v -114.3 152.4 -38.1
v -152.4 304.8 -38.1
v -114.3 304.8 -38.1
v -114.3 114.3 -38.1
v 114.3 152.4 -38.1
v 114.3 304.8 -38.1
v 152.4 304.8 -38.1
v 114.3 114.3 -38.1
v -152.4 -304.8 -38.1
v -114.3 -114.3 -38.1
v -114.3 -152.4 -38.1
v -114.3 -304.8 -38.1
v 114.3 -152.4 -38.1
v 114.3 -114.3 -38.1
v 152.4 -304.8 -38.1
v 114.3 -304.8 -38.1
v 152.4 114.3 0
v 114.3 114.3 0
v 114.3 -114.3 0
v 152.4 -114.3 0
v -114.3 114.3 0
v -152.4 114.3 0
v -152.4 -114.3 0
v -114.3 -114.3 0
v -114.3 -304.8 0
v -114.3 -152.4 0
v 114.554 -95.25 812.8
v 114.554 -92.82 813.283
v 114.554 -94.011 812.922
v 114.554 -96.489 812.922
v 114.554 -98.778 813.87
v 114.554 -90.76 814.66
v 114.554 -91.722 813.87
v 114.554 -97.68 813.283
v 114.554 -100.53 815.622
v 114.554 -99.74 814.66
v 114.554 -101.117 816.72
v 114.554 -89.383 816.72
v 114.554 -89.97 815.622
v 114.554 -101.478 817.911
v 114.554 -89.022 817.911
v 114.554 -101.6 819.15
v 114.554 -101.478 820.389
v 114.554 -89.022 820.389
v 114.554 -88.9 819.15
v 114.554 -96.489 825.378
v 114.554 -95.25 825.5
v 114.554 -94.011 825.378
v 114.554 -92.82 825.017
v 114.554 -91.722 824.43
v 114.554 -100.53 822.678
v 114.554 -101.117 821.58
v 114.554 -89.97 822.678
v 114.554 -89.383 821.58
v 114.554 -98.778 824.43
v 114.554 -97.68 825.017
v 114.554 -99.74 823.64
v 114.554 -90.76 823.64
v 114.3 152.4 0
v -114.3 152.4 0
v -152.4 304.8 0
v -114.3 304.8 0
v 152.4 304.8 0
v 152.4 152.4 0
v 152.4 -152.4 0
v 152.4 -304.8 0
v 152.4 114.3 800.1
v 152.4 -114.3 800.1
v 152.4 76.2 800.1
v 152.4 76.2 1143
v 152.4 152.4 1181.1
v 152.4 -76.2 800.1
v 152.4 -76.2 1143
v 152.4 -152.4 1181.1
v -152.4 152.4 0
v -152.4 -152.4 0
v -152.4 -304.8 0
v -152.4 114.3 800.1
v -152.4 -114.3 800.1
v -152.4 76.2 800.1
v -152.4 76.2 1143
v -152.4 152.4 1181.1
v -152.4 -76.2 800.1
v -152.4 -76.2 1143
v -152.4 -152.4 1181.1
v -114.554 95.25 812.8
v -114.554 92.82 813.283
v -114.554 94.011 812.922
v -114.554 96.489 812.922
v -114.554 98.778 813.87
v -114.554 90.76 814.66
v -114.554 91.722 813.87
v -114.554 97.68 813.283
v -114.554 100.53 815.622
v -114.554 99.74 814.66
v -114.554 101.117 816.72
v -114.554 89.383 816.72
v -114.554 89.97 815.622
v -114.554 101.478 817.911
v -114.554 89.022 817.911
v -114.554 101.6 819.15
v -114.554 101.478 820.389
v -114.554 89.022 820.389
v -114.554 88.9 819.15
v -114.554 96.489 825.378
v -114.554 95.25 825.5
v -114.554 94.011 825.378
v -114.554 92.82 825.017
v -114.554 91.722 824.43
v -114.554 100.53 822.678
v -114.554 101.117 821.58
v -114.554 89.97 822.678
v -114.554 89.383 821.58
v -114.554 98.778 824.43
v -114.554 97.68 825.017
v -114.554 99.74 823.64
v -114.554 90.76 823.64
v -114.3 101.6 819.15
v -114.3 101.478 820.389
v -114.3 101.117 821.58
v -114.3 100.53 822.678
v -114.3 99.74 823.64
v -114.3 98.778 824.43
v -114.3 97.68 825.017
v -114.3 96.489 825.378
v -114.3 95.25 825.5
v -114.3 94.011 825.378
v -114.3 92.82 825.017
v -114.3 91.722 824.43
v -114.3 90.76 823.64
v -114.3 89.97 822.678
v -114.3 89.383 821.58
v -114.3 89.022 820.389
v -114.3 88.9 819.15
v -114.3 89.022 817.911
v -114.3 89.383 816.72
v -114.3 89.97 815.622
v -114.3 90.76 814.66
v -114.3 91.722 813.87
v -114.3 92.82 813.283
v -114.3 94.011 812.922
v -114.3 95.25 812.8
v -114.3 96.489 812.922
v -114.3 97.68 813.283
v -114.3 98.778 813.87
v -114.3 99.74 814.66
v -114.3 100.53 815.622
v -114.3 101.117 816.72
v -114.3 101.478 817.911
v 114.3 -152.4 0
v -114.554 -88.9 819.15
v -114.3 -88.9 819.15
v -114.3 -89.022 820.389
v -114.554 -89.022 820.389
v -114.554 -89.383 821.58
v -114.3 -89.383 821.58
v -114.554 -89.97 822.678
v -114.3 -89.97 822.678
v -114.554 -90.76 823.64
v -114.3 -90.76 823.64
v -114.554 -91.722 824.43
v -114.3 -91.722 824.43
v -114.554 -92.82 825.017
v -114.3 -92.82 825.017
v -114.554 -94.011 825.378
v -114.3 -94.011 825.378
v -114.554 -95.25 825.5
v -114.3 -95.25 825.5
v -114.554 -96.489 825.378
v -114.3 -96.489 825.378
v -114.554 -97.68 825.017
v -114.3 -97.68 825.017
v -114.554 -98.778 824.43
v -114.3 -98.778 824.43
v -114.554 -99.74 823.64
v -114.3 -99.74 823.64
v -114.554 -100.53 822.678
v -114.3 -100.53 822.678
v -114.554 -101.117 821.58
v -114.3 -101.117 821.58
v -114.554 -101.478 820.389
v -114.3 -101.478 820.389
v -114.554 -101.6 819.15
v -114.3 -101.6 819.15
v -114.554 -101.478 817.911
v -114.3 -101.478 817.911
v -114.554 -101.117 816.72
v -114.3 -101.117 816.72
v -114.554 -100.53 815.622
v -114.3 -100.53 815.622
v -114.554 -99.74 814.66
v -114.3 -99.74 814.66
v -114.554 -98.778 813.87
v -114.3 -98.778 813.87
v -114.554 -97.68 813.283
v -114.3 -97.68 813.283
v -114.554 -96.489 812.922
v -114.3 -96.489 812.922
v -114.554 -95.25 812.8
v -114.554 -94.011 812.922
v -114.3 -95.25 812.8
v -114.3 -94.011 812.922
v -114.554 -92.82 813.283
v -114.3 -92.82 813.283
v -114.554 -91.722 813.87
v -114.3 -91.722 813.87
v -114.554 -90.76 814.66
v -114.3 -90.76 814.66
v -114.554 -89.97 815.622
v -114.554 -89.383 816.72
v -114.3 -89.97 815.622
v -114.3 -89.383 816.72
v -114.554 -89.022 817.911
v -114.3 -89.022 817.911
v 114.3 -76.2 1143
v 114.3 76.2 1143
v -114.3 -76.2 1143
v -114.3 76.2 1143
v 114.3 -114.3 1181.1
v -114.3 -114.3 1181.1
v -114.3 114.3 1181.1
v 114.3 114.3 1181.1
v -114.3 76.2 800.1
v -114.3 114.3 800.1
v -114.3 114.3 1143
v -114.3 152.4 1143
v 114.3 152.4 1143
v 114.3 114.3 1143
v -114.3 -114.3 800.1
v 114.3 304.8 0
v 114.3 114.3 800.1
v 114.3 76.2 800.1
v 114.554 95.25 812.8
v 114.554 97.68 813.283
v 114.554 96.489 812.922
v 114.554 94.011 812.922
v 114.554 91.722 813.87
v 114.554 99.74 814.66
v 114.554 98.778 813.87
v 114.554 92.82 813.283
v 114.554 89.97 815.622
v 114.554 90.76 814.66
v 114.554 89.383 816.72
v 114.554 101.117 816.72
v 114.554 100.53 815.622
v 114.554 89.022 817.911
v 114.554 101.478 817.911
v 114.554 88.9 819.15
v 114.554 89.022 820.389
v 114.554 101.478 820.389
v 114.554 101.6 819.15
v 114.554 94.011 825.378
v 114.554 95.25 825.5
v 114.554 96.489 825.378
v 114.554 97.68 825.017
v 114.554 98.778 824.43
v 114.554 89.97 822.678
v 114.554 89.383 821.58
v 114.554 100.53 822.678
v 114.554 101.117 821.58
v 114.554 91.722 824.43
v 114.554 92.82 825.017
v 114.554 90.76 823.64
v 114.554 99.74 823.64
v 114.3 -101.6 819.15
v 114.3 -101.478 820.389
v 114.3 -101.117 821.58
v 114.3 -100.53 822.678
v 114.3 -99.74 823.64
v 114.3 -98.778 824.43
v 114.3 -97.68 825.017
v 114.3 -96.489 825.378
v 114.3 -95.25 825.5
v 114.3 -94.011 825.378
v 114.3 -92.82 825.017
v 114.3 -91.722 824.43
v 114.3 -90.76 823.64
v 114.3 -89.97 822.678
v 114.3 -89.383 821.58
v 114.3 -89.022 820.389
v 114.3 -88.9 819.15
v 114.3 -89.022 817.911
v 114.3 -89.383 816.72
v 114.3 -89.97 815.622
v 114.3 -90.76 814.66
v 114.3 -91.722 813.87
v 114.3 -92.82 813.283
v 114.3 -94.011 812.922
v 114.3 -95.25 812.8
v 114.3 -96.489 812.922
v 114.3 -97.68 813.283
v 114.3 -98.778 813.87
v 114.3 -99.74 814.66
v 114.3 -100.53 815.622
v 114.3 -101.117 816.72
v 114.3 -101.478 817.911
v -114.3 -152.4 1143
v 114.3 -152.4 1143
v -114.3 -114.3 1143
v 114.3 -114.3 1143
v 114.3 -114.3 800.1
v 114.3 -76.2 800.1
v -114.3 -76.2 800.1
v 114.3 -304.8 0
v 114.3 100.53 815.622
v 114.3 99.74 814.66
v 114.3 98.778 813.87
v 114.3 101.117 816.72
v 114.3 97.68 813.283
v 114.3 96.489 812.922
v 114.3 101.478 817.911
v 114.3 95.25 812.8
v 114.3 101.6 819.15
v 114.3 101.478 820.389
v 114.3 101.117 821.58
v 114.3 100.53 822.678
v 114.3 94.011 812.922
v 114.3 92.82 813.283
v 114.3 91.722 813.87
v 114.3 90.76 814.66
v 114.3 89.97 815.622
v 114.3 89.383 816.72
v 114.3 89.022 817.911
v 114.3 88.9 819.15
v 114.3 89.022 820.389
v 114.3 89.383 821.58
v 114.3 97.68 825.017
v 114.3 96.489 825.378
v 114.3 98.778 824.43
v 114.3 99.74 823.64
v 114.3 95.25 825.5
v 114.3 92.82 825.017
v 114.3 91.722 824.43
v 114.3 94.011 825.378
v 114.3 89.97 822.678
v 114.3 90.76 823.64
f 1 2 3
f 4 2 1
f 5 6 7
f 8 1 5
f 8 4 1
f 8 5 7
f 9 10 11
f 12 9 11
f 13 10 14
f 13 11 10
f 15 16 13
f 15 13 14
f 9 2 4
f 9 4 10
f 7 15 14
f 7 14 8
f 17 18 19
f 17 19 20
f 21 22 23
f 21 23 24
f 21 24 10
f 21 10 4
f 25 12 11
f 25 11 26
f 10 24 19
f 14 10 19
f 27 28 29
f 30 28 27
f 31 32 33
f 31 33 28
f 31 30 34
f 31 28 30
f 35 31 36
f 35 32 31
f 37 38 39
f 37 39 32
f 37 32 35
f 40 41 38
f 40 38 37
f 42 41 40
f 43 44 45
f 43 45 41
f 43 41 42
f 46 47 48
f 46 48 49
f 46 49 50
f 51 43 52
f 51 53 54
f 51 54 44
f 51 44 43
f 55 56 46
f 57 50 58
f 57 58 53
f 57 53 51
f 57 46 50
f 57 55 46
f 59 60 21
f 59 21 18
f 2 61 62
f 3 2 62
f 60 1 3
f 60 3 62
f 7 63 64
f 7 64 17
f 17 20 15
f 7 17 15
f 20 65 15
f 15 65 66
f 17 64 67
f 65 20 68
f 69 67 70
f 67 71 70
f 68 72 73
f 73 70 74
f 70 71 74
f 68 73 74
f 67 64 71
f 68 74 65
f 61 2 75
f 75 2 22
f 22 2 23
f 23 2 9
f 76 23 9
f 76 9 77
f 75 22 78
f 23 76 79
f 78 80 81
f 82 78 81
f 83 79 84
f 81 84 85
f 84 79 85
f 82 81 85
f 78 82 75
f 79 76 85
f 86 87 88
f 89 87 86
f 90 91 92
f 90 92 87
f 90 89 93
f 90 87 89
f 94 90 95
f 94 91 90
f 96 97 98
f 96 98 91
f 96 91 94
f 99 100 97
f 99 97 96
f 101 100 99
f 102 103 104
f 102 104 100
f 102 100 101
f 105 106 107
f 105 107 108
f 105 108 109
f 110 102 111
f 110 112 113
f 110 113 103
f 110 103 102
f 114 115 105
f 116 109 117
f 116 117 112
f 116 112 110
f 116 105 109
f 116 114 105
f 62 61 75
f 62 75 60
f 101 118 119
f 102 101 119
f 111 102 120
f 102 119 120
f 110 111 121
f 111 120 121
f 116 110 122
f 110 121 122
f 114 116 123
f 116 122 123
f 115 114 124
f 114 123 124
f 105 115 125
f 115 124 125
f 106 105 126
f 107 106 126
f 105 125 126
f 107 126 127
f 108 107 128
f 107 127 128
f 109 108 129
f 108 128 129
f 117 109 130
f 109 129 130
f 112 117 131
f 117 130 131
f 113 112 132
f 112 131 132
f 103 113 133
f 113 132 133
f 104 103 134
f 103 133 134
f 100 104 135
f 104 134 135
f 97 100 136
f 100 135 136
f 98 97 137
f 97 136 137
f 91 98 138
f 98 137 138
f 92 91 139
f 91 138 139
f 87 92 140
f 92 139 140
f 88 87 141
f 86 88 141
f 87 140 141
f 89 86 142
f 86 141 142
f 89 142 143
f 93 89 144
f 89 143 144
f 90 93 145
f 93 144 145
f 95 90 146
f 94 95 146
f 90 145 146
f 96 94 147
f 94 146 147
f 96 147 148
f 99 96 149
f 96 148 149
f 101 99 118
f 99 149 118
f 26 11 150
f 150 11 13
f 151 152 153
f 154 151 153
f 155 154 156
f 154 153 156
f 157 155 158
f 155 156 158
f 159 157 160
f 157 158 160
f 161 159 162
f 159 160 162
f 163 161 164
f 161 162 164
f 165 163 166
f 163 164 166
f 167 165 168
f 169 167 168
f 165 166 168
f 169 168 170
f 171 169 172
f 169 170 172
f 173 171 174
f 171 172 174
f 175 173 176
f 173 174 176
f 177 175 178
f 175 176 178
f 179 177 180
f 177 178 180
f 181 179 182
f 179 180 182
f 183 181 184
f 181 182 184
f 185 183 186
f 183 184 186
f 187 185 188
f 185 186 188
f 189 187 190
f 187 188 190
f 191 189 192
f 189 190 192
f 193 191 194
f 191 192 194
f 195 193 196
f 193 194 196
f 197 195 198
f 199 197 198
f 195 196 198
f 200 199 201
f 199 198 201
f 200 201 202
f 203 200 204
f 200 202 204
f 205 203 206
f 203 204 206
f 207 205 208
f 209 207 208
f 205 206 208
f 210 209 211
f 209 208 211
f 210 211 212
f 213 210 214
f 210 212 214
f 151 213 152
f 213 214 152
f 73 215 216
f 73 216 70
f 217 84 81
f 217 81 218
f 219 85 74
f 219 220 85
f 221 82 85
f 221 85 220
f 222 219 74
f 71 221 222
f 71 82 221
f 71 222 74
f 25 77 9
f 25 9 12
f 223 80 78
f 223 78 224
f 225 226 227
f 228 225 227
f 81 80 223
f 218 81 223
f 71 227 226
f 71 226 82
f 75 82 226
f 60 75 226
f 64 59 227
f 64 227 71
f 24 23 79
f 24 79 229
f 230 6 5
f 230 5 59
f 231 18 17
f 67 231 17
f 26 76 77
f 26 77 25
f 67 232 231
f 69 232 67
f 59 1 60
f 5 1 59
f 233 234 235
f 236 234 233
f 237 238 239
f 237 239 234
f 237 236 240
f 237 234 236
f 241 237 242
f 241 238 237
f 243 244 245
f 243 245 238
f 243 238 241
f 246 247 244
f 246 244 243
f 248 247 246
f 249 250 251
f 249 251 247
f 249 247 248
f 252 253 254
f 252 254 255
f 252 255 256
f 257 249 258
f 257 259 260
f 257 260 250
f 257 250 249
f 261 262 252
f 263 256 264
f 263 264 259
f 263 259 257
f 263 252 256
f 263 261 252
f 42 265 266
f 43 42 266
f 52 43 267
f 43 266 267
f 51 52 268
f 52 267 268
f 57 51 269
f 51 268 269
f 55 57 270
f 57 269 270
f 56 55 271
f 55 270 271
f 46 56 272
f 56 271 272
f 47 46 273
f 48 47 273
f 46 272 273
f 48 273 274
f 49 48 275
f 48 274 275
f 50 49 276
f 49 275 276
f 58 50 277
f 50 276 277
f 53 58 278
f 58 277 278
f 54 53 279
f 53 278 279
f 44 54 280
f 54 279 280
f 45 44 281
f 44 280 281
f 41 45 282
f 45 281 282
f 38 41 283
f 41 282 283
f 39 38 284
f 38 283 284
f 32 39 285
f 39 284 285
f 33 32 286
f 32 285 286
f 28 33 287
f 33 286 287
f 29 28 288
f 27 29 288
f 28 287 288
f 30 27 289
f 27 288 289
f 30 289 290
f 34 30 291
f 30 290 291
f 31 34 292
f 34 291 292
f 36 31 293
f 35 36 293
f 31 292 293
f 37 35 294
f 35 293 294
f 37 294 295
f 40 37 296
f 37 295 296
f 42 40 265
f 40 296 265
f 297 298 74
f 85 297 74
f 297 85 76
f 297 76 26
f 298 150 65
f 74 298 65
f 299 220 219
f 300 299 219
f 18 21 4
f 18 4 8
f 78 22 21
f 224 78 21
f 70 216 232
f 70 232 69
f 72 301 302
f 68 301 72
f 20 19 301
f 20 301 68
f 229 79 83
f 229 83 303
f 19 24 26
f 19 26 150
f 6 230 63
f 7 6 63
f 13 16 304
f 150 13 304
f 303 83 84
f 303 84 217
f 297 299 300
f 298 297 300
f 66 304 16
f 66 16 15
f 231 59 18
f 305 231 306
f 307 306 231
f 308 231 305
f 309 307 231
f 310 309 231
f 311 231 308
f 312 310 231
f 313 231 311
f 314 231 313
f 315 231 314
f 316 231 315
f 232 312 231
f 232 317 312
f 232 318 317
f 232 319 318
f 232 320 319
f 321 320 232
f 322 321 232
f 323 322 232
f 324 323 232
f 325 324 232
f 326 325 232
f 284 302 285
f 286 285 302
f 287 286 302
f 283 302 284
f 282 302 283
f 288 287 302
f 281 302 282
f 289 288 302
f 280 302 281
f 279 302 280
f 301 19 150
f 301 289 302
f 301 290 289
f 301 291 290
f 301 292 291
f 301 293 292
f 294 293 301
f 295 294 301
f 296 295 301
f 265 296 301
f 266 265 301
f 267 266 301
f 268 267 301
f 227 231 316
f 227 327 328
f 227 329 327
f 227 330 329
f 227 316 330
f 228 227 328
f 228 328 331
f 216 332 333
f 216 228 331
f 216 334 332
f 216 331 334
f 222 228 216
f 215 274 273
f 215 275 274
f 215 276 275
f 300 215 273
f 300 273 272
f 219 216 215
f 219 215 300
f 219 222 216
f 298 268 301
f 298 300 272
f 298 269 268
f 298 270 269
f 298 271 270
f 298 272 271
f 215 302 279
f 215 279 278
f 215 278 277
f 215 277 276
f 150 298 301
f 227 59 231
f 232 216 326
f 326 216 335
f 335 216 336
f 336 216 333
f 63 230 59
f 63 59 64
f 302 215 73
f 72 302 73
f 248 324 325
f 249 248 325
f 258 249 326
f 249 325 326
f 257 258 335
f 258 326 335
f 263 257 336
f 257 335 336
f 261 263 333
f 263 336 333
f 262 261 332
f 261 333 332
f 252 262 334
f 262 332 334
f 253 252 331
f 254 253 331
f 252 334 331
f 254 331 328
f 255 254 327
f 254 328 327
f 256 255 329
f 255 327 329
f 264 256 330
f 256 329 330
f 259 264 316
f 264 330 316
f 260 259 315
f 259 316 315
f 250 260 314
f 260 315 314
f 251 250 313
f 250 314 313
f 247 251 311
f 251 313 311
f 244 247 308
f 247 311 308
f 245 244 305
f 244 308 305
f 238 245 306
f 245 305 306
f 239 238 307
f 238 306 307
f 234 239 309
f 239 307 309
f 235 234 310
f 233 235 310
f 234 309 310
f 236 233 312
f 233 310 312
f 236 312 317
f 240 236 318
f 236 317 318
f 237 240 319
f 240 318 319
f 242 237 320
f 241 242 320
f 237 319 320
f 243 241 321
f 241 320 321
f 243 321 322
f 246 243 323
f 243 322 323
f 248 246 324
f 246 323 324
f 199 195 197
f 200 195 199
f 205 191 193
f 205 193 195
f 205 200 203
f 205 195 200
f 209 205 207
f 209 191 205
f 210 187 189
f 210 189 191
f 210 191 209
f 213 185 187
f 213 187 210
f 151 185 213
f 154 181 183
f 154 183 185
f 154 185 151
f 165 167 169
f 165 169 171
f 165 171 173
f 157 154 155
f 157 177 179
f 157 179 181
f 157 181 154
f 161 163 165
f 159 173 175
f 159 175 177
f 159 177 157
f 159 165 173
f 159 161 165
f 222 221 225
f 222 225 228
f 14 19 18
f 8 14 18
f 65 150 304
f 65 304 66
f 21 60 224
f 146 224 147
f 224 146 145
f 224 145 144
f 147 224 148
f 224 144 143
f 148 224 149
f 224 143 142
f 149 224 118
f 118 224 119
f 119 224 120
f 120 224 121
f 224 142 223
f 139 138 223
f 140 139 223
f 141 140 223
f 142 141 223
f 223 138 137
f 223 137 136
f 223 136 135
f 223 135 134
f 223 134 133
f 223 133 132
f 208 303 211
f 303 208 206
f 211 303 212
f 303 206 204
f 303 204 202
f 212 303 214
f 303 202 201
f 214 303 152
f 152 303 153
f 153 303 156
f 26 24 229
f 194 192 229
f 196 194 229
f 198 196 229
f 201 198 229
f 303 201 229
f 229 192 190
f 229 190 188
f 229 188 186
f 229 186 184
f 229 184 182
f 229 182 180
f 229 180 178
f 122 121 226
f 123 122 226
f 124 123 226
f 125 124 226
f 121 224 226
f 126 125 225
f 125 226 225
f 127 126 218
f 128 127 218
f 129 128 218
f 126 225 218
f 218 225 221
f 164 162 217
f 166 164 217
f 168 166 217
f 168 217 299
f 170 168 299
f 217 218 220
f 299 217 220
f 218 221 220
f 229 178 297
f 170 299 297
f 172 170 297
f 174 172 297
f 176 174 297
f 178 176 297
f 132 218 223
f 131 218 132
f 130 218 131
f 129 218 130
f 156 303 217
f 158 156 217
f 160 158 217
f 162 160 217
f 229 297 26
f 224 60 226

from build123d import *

# Parameters (mm, degrees)
F0_W      = 304.8
F0_H      = 304.8
F1_DEPTH  = 38.1
F2_W      = 228.6
F2_H      = 228.6
F3_DEPTH  = 38.1
F4_W      = 38.1
F4_H      = 38.1
F5_DEPTH  = 1143
F6_W      = 304.8
F6_H      = 304.8
F7_DEPTH  = 38.1
F8_W      = 228.6
F8_H      = 228.6
F9_DEPTH  = 38.1
F10_W     = 38.1
F10_H     = 38.1
F11_DEPTH = 342.9
F12_W     = 38.1
F12_H     = 38.1
F13_DEPTH = 342.9
F14_R     = 6.35
F16_DEPTH = 0.254
F15_R     = 6.35
F17_DEPTH = 0.254
F18_W     = 38.1
F18_H     = 38.1
F19_DEPTH = 304.8


with BuildPart() as f1:
    # F0 (on Top) → F1 (new body)
    with BuildSketch(Plane.XY):
        Rectangle(F0_W, F0_H)
    extrude(amount=-F1_DEPTH)

    # F2 (on face) → F3 (cut)
    with BuildSketch(Plane.XY):
        Rectangle(F2_W, F2_H)
    extrude(amount=-F3_DEPTH, mode=Mode.SUBTRACT)

    # F4 (on face) → F5 (join)
    with BuildSketch(Plane.XY):
        with Locations((-133.35, 133.35)):
            Rectangle(F4_W, F4_H)
        with Locations((133.35, 133.35)):
            Rectangle(F4_W, F4_H)
        with Locations((133.35, -133.35)):
            Rectangle(F4_W, F4_H)
        with Locations((-133.35, -133.35)):
            Rectangle(F4_W, F4_H)
    extrude(amount=F5_DEPTH)

    # F6 (on face) → F7 (join)
    with BuildSketch(Plane.XY.offset(1143)):
        Rectangle(F6_W, F6_H)
    extrude(amount=F7_DEPTH)

    # F8 (on face) → F9 (cut)
    with BuildSketch(Plane.XY.offset(1181.1)):
        Rectangle(F8_W, F8_H)
    extrude(amount=-F9_DEPTH, mode=Mode.SUBTRACT)

    # F10 (on face) → F11 (join)
    with BuildSketch(Plane(origin=(0, 0, 1143), x_dir=(1, 0, 0), z_dir=(0, 0, -1))):
        with Locations((133.35, 95.25)):
            Rectangle(F10_W, F10_H)
        with Locations((133.35, -95.25)):
            Rectangle(F10_W, F10_H)
    extrude(amount=F11_DEPTH)

    # F12 (on face) → F13 (join)
    with BuildSketch(Plane(origin=(0, 0, 1143), x_dir=(1, 0, 0), z_dir=(0, 0, -1))):
        with Locations((-133.35, -95.25)):
            Rectangle(F12_W, F12_H)
        with Locations((-133.35, 95.25)):
            Rectangle(F12_W, F12_H)
    extrude(amount=F13_DEPTH)

    # F14 (on face) → F16 (cut)
    with BuildSketch(Plane.YZ.offset(-114.3)):
        with Locations((95.25, 819.15)):
            Circle(F14_R)
        with Locations((-95.25, 819.15)):
            Circle(F14_R)
    extrude(amount=-F16_DEPTH, mode=Mode.SUBTRACT)

    # F15 (on face) → F17 (cut)
    with BuildSketch(Plane(origin=(114.3, 0, 0), x_dir=(0, -1, 0), z_dir=(-1, 0, 0))):
        with Locations((-95.25, 819.15)):
            Circle(F15_R)
        with Locations((95.25, 819.15)):
            Circle(F15_R)
    extrude(amount=-F17_DEPTH, mode=Mode.SUBTRACT)

    # F18 (on Front) → F19 (join, symmetric)
    with BuildSketch(Plane.XZ):
        with Locations((133.35, -19.05)):
            Rectangle(F18_W, F18_H)
        with Locations((-133.35, -19.05)):
            Rectangle(F18_W, F18_H)
    extrude(amount=F19_DEPTH, both=True)


solid = f1.part
